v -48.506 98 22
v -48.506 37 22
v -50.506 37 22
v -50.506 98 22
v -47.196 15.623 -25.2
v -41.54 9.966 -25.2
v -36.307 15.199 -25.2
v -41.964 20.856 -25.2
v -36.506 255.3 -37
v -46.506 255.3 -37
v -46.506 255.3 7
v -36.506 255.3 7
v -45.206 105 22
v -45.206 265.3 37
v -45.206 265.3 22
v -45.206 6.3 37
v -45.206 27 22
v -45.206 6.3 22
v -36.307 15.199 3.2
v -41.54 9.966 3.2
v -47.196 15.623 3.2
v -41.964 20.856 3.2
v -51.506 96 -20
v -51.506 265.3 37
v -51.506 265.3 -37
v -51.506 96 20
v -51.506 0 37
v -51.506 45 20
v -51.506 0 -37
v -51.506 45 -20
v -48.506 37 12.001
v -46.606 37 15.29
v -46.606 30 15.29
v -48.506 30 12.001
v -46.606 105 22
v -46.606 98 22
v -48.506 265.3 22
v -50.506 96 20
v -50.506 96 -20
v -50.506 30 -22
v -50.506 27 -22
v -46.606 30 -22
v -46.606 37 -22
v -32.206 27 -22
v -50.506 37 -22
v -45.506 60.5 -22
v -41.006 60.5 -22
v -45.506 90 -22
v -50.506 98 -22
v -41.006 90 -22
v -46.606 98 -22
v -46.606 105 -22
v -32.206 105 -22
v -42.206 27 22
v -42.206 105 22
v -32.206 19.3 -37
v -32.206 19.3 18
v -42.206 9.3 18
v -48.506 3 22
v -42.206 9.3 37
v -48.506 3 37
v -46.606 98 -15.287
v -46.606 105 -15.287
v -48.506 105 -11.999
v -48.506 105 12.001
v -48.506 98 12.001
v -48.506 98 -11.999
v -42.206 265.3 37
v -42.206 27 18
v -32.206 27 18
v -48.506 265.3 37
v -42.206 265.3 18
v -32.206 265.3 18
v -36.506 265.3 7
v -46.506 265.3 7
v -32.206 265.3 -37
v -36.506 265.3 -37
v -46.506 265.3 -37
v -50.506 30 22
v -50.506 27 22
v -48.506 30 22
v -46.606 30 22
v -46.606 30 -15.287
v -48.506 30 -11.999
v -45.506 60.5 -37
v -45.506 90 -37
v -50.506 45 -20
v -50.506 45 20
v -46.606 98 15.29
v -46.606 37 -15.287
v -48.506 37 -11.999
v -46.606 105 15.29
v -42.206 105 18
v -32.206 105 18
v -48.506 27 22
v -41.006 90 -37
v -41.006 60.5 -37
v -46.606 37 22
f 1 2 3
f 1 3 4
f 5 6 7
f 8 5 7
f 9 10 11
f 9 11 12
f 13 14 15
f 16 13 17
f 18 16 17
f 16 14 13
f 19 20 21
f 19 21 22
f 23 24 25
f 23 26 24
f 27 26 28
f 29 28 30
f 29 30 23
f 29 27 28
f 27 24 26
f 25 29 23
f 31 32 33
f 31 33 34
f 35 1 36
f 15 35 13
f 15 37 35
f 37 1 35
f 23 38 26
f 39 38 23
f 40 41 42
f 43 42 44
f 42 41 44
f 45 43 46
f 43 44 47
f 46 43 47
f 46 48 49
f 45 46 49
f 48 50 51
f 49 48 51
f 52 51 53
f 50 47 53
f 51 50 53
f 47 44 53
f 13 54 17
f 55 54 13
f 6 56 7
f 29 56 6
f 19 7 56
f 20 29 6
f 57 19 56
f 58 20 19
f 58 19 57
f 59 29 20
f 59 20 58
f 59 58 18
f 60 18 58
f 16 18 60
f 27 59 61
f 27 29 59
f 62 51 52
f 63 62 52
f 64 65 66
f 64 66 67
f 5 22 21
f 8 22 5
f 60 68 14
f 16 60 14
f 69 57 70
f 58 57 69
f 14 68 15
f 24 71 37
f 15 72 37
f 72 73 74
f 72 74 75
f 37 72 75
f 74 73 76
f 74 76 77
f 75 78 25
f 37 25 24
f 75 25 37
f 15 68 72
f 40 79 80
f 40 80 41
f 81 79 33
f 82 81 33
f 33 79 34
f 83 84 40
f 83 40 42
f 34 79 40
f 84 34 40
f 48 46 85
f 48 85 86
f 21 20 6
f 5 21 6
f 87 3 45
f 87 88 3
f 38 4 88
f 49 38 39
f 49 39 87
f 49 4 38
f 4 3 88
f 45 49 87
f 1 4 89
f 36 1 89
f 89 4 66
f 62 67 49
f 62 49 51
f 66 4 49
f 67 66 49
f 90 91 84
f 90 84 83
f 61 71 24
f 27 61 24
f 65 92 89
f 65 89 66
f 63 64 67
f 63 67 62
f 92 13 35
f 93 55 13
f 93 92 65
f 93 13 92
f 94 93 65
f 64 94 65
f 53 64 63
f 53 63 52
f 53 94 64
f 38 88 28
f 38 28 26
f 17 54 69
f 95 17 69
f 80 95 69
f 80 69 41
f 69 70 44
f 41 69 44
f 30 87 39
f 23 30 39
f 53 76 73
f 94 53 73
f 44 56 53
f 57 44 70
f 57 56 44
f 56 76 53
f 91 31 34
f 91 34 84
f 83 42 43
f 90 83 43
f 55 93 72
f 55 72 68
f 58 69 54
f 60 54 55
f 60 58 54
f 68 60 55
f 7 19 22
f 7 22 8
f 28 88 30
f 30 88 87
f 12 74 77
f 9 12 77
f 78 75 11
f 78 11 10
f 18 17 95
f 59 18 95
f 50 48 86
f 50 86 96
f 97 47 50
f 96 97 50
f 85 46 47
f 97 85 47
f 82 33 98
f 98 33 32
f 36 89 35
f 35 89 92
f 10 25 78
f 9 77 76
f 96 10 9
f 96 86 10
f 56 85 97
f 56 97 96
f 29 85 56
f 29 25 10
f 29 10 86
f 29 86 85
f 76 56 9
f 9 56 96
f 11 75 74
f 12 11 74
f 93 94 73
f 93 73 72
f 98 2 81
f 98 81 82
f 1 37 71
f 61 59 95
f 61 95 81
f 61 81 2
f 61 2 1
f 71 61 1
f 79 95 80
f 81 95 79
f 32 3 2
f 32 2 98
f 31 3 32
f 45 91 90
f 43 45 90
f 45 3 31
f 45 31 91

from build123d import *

# Parameters (mm, degrees)
BOSS_EXTRUDE1_DEPTH = 265.3
SKETCH2_W           = 10
SKETCH2_H           = 44
CUT_EXTRUDE1_DEPTH  = 10
SKETCH3_W           = 271.149403365
SKETCH3_H           = 159.03985052
CUT_EXTRUDE2_DEPTH  = 31
SKETCH4_W           = 28
SKETCH4_H           = 7
CUT_EXTRUDE3_DEPTH  = 8
SKETCH5_W           = 28.4
SKETCH5_H           = 7.4
CUT_EXTRUDE4_DEPTH  = 8
SKETCH6_W           = 44
SKETCH6_H           = 78
CUT_EXTRUDE5_DEPTH  = 18.3
SKETCH7_W           = 40
SKETCH7_H           = 51
CUT_EXTRUDE6_DEPTH  = 18.3
SKETCH8_W           = 3.9
SKETCH8_H           = 7
BOSS_EXTRUDE2_DEPTH = 44
CUT_EXTRUDE7_DEPTH  = 7
LPATTERN1_COUNT     = 2
LPATTERN1_PITCH     = 68
SKETCH11_W          = 4.5
SKETCH11_H          = 29.5
CUT_EXTRUDE8_DEPTH  = 15


with BuildPart() as part:
    # Sketch1 → Boss-Extrude1 (new body)
    with BuildSketch(Plane(origin=(0, 0, 0), x_dir=(1, 0, 0), z_dir=(0, 1, 0))):
        Polygon((-51.505795374, 37), (-32.205795374, 37), (-32.205795374, -18), (-42.205795374, -18), (-42.205795374, -37), (-45.205795374, -37), (-45.205795374, -22), (-48.505795374, -22), (-48.505795374, -37), (-51.505795374, -37), align=None)
    extrude(amount=BOSS_EXTRUDE1_DEPTH)

    # Sketch2 → Cut-Extrude1 (cut)
    with BuildSketch(Plane(origin=(0, 265.3, 0), x_dir=(1, 0, 0), z_dir=(0, 1, 0))):
        with Locations((-41.505795374, 15)):
            Rectangle(SKETCH2_W, SKETCH2_H)
    extrude(amount=-CUT_EXTRUDE1_DEPTH, mode=Mode.SUBTRACT)

    # Sketch3 → Cut-Extrude2 (cut)
    with BuildSketch(Plane(origin=(-25.752897687, 25.752897687, 0), x_dir=(0, 0, 1), z_dir=(0.7071067811865488, -0.7071067811865464, 0))):
        with Locations((3.075588753, 19.523863597)):
            Rectangle(SKETCH3_W, SKETCH3_H)
    extrude(amount=CUT_EXTRUDE2_DEPTH, mode=Mode.SUBTRACT)

    # Sketch4 → Cut-Extrude3 (cut)
    with BuildSketch(Plane(origin=(-25.752897687, 25.752897687, 0), x_dir=(0, 0, -1), z_dir=(0.7071067811865487, -0.7071067811865465, 0))):
        with Locations((11, -18.625775426)):
            Rectangle(SKETCH4_W, SKETCH4_H)
    extrude(amount=-CUT_EXTRUDE3_DEPTH, mode=Mode.SUBTRACT)

    # Sketch5 → Cut-Extrude4 (cut)
    with BuildSketch(Plane(origin=(-25.752897687, 25.752897687, 0), x_dir=(0, 0, -1), z_dir=(0.7071067811865487, -0.7071067811865465, 0))):
        with Locations((11, -18.625775426)):
            Rectangle(SKETCH5_W, SKETCH5_H)
    extrude(amount=-CUT_EXTRUDE4_DEPTH, mode=Mode.SUBTRACT)

    # Sketch6 → Cut-Extrude5 (cut)
    with BuildSketch(Plane(origin=(-32.205795374, 0, 0), x_dir=(0, 0, -1), z_dir=(1, 0, 0))):
        with Locations((0, 66)):
            Rectangle(SKETCH6_W, SKETCH6_H)
    extrude(amount=-CUT_EXTRUDE5_DEPTH, mode=Mode.SUBTRACT)

    # Sketch7 → Cut-Extrude6 (cut)
    with BuildSketch(Plane(origin=(-50.505795374, 0, 0), x_dir=(0, 0, -1), z_dir=(1, 0, 0))):
        with Locations((0, 70.5)):
            Rectangle(SKETCH7_W, SKETCH7_H)
    extrude(amount=-CUT_EXTRUDE6_DEPTH, mode=Mode.SUBTRACT)

    # Sketch8 → Boss-Extrude2 (add)
    with BuildSketch(Plane.XY.offset(-22)):
        with Locations((-48.555795374, 33.5)):
            Rectangle(SKETCH8_W, SKETCH8_H)
    boss_extrude2 = extrude(amount=BOSS_EXTRUDE2_DEPTH)

    # Sketch10 → Cut-Extrude7 (cut)
    with BuildSketch(Plane(origin=(0, 37, 0), x_dir=(1, 0, 0), z_dir=(0, 1, 0))):
        Polygon((-46.605795374, -15.29), (-48.505795374, -12.001413069), (-48.505795374, 11.998586931), (-46.605795374, 15.287173861), align=None)
    cut_extrude7 = extrude(amount=-CUT_EXTRUDE7_DEPTH, mode=Mode.SUBTRACT)

    # LPattern1: Boss-Extrude2, Cut-Extrude7 ×2
    with Locations(*[(0, i * LPATTERN1_PITCH, 0) for i in range(1, LPATTERN1_COUNT)]):
        add(boss_extrude2)
        add(cut_extrude7, mode=Mode.SUBTRACT)

    # Sketch11 → Cut-Extrude8 (cut)
    with BuildSketch(Plane.XY.offset(-22)):
        with Locations((-43.255795374, 75.25)):
            Rectangle(SKETCH11_W, SKETCH11_H)
    extrude(amount=-CUT_EXTRUDE8_DEPTH, mode=Mode.SUBTRACT)


solid = part.part
